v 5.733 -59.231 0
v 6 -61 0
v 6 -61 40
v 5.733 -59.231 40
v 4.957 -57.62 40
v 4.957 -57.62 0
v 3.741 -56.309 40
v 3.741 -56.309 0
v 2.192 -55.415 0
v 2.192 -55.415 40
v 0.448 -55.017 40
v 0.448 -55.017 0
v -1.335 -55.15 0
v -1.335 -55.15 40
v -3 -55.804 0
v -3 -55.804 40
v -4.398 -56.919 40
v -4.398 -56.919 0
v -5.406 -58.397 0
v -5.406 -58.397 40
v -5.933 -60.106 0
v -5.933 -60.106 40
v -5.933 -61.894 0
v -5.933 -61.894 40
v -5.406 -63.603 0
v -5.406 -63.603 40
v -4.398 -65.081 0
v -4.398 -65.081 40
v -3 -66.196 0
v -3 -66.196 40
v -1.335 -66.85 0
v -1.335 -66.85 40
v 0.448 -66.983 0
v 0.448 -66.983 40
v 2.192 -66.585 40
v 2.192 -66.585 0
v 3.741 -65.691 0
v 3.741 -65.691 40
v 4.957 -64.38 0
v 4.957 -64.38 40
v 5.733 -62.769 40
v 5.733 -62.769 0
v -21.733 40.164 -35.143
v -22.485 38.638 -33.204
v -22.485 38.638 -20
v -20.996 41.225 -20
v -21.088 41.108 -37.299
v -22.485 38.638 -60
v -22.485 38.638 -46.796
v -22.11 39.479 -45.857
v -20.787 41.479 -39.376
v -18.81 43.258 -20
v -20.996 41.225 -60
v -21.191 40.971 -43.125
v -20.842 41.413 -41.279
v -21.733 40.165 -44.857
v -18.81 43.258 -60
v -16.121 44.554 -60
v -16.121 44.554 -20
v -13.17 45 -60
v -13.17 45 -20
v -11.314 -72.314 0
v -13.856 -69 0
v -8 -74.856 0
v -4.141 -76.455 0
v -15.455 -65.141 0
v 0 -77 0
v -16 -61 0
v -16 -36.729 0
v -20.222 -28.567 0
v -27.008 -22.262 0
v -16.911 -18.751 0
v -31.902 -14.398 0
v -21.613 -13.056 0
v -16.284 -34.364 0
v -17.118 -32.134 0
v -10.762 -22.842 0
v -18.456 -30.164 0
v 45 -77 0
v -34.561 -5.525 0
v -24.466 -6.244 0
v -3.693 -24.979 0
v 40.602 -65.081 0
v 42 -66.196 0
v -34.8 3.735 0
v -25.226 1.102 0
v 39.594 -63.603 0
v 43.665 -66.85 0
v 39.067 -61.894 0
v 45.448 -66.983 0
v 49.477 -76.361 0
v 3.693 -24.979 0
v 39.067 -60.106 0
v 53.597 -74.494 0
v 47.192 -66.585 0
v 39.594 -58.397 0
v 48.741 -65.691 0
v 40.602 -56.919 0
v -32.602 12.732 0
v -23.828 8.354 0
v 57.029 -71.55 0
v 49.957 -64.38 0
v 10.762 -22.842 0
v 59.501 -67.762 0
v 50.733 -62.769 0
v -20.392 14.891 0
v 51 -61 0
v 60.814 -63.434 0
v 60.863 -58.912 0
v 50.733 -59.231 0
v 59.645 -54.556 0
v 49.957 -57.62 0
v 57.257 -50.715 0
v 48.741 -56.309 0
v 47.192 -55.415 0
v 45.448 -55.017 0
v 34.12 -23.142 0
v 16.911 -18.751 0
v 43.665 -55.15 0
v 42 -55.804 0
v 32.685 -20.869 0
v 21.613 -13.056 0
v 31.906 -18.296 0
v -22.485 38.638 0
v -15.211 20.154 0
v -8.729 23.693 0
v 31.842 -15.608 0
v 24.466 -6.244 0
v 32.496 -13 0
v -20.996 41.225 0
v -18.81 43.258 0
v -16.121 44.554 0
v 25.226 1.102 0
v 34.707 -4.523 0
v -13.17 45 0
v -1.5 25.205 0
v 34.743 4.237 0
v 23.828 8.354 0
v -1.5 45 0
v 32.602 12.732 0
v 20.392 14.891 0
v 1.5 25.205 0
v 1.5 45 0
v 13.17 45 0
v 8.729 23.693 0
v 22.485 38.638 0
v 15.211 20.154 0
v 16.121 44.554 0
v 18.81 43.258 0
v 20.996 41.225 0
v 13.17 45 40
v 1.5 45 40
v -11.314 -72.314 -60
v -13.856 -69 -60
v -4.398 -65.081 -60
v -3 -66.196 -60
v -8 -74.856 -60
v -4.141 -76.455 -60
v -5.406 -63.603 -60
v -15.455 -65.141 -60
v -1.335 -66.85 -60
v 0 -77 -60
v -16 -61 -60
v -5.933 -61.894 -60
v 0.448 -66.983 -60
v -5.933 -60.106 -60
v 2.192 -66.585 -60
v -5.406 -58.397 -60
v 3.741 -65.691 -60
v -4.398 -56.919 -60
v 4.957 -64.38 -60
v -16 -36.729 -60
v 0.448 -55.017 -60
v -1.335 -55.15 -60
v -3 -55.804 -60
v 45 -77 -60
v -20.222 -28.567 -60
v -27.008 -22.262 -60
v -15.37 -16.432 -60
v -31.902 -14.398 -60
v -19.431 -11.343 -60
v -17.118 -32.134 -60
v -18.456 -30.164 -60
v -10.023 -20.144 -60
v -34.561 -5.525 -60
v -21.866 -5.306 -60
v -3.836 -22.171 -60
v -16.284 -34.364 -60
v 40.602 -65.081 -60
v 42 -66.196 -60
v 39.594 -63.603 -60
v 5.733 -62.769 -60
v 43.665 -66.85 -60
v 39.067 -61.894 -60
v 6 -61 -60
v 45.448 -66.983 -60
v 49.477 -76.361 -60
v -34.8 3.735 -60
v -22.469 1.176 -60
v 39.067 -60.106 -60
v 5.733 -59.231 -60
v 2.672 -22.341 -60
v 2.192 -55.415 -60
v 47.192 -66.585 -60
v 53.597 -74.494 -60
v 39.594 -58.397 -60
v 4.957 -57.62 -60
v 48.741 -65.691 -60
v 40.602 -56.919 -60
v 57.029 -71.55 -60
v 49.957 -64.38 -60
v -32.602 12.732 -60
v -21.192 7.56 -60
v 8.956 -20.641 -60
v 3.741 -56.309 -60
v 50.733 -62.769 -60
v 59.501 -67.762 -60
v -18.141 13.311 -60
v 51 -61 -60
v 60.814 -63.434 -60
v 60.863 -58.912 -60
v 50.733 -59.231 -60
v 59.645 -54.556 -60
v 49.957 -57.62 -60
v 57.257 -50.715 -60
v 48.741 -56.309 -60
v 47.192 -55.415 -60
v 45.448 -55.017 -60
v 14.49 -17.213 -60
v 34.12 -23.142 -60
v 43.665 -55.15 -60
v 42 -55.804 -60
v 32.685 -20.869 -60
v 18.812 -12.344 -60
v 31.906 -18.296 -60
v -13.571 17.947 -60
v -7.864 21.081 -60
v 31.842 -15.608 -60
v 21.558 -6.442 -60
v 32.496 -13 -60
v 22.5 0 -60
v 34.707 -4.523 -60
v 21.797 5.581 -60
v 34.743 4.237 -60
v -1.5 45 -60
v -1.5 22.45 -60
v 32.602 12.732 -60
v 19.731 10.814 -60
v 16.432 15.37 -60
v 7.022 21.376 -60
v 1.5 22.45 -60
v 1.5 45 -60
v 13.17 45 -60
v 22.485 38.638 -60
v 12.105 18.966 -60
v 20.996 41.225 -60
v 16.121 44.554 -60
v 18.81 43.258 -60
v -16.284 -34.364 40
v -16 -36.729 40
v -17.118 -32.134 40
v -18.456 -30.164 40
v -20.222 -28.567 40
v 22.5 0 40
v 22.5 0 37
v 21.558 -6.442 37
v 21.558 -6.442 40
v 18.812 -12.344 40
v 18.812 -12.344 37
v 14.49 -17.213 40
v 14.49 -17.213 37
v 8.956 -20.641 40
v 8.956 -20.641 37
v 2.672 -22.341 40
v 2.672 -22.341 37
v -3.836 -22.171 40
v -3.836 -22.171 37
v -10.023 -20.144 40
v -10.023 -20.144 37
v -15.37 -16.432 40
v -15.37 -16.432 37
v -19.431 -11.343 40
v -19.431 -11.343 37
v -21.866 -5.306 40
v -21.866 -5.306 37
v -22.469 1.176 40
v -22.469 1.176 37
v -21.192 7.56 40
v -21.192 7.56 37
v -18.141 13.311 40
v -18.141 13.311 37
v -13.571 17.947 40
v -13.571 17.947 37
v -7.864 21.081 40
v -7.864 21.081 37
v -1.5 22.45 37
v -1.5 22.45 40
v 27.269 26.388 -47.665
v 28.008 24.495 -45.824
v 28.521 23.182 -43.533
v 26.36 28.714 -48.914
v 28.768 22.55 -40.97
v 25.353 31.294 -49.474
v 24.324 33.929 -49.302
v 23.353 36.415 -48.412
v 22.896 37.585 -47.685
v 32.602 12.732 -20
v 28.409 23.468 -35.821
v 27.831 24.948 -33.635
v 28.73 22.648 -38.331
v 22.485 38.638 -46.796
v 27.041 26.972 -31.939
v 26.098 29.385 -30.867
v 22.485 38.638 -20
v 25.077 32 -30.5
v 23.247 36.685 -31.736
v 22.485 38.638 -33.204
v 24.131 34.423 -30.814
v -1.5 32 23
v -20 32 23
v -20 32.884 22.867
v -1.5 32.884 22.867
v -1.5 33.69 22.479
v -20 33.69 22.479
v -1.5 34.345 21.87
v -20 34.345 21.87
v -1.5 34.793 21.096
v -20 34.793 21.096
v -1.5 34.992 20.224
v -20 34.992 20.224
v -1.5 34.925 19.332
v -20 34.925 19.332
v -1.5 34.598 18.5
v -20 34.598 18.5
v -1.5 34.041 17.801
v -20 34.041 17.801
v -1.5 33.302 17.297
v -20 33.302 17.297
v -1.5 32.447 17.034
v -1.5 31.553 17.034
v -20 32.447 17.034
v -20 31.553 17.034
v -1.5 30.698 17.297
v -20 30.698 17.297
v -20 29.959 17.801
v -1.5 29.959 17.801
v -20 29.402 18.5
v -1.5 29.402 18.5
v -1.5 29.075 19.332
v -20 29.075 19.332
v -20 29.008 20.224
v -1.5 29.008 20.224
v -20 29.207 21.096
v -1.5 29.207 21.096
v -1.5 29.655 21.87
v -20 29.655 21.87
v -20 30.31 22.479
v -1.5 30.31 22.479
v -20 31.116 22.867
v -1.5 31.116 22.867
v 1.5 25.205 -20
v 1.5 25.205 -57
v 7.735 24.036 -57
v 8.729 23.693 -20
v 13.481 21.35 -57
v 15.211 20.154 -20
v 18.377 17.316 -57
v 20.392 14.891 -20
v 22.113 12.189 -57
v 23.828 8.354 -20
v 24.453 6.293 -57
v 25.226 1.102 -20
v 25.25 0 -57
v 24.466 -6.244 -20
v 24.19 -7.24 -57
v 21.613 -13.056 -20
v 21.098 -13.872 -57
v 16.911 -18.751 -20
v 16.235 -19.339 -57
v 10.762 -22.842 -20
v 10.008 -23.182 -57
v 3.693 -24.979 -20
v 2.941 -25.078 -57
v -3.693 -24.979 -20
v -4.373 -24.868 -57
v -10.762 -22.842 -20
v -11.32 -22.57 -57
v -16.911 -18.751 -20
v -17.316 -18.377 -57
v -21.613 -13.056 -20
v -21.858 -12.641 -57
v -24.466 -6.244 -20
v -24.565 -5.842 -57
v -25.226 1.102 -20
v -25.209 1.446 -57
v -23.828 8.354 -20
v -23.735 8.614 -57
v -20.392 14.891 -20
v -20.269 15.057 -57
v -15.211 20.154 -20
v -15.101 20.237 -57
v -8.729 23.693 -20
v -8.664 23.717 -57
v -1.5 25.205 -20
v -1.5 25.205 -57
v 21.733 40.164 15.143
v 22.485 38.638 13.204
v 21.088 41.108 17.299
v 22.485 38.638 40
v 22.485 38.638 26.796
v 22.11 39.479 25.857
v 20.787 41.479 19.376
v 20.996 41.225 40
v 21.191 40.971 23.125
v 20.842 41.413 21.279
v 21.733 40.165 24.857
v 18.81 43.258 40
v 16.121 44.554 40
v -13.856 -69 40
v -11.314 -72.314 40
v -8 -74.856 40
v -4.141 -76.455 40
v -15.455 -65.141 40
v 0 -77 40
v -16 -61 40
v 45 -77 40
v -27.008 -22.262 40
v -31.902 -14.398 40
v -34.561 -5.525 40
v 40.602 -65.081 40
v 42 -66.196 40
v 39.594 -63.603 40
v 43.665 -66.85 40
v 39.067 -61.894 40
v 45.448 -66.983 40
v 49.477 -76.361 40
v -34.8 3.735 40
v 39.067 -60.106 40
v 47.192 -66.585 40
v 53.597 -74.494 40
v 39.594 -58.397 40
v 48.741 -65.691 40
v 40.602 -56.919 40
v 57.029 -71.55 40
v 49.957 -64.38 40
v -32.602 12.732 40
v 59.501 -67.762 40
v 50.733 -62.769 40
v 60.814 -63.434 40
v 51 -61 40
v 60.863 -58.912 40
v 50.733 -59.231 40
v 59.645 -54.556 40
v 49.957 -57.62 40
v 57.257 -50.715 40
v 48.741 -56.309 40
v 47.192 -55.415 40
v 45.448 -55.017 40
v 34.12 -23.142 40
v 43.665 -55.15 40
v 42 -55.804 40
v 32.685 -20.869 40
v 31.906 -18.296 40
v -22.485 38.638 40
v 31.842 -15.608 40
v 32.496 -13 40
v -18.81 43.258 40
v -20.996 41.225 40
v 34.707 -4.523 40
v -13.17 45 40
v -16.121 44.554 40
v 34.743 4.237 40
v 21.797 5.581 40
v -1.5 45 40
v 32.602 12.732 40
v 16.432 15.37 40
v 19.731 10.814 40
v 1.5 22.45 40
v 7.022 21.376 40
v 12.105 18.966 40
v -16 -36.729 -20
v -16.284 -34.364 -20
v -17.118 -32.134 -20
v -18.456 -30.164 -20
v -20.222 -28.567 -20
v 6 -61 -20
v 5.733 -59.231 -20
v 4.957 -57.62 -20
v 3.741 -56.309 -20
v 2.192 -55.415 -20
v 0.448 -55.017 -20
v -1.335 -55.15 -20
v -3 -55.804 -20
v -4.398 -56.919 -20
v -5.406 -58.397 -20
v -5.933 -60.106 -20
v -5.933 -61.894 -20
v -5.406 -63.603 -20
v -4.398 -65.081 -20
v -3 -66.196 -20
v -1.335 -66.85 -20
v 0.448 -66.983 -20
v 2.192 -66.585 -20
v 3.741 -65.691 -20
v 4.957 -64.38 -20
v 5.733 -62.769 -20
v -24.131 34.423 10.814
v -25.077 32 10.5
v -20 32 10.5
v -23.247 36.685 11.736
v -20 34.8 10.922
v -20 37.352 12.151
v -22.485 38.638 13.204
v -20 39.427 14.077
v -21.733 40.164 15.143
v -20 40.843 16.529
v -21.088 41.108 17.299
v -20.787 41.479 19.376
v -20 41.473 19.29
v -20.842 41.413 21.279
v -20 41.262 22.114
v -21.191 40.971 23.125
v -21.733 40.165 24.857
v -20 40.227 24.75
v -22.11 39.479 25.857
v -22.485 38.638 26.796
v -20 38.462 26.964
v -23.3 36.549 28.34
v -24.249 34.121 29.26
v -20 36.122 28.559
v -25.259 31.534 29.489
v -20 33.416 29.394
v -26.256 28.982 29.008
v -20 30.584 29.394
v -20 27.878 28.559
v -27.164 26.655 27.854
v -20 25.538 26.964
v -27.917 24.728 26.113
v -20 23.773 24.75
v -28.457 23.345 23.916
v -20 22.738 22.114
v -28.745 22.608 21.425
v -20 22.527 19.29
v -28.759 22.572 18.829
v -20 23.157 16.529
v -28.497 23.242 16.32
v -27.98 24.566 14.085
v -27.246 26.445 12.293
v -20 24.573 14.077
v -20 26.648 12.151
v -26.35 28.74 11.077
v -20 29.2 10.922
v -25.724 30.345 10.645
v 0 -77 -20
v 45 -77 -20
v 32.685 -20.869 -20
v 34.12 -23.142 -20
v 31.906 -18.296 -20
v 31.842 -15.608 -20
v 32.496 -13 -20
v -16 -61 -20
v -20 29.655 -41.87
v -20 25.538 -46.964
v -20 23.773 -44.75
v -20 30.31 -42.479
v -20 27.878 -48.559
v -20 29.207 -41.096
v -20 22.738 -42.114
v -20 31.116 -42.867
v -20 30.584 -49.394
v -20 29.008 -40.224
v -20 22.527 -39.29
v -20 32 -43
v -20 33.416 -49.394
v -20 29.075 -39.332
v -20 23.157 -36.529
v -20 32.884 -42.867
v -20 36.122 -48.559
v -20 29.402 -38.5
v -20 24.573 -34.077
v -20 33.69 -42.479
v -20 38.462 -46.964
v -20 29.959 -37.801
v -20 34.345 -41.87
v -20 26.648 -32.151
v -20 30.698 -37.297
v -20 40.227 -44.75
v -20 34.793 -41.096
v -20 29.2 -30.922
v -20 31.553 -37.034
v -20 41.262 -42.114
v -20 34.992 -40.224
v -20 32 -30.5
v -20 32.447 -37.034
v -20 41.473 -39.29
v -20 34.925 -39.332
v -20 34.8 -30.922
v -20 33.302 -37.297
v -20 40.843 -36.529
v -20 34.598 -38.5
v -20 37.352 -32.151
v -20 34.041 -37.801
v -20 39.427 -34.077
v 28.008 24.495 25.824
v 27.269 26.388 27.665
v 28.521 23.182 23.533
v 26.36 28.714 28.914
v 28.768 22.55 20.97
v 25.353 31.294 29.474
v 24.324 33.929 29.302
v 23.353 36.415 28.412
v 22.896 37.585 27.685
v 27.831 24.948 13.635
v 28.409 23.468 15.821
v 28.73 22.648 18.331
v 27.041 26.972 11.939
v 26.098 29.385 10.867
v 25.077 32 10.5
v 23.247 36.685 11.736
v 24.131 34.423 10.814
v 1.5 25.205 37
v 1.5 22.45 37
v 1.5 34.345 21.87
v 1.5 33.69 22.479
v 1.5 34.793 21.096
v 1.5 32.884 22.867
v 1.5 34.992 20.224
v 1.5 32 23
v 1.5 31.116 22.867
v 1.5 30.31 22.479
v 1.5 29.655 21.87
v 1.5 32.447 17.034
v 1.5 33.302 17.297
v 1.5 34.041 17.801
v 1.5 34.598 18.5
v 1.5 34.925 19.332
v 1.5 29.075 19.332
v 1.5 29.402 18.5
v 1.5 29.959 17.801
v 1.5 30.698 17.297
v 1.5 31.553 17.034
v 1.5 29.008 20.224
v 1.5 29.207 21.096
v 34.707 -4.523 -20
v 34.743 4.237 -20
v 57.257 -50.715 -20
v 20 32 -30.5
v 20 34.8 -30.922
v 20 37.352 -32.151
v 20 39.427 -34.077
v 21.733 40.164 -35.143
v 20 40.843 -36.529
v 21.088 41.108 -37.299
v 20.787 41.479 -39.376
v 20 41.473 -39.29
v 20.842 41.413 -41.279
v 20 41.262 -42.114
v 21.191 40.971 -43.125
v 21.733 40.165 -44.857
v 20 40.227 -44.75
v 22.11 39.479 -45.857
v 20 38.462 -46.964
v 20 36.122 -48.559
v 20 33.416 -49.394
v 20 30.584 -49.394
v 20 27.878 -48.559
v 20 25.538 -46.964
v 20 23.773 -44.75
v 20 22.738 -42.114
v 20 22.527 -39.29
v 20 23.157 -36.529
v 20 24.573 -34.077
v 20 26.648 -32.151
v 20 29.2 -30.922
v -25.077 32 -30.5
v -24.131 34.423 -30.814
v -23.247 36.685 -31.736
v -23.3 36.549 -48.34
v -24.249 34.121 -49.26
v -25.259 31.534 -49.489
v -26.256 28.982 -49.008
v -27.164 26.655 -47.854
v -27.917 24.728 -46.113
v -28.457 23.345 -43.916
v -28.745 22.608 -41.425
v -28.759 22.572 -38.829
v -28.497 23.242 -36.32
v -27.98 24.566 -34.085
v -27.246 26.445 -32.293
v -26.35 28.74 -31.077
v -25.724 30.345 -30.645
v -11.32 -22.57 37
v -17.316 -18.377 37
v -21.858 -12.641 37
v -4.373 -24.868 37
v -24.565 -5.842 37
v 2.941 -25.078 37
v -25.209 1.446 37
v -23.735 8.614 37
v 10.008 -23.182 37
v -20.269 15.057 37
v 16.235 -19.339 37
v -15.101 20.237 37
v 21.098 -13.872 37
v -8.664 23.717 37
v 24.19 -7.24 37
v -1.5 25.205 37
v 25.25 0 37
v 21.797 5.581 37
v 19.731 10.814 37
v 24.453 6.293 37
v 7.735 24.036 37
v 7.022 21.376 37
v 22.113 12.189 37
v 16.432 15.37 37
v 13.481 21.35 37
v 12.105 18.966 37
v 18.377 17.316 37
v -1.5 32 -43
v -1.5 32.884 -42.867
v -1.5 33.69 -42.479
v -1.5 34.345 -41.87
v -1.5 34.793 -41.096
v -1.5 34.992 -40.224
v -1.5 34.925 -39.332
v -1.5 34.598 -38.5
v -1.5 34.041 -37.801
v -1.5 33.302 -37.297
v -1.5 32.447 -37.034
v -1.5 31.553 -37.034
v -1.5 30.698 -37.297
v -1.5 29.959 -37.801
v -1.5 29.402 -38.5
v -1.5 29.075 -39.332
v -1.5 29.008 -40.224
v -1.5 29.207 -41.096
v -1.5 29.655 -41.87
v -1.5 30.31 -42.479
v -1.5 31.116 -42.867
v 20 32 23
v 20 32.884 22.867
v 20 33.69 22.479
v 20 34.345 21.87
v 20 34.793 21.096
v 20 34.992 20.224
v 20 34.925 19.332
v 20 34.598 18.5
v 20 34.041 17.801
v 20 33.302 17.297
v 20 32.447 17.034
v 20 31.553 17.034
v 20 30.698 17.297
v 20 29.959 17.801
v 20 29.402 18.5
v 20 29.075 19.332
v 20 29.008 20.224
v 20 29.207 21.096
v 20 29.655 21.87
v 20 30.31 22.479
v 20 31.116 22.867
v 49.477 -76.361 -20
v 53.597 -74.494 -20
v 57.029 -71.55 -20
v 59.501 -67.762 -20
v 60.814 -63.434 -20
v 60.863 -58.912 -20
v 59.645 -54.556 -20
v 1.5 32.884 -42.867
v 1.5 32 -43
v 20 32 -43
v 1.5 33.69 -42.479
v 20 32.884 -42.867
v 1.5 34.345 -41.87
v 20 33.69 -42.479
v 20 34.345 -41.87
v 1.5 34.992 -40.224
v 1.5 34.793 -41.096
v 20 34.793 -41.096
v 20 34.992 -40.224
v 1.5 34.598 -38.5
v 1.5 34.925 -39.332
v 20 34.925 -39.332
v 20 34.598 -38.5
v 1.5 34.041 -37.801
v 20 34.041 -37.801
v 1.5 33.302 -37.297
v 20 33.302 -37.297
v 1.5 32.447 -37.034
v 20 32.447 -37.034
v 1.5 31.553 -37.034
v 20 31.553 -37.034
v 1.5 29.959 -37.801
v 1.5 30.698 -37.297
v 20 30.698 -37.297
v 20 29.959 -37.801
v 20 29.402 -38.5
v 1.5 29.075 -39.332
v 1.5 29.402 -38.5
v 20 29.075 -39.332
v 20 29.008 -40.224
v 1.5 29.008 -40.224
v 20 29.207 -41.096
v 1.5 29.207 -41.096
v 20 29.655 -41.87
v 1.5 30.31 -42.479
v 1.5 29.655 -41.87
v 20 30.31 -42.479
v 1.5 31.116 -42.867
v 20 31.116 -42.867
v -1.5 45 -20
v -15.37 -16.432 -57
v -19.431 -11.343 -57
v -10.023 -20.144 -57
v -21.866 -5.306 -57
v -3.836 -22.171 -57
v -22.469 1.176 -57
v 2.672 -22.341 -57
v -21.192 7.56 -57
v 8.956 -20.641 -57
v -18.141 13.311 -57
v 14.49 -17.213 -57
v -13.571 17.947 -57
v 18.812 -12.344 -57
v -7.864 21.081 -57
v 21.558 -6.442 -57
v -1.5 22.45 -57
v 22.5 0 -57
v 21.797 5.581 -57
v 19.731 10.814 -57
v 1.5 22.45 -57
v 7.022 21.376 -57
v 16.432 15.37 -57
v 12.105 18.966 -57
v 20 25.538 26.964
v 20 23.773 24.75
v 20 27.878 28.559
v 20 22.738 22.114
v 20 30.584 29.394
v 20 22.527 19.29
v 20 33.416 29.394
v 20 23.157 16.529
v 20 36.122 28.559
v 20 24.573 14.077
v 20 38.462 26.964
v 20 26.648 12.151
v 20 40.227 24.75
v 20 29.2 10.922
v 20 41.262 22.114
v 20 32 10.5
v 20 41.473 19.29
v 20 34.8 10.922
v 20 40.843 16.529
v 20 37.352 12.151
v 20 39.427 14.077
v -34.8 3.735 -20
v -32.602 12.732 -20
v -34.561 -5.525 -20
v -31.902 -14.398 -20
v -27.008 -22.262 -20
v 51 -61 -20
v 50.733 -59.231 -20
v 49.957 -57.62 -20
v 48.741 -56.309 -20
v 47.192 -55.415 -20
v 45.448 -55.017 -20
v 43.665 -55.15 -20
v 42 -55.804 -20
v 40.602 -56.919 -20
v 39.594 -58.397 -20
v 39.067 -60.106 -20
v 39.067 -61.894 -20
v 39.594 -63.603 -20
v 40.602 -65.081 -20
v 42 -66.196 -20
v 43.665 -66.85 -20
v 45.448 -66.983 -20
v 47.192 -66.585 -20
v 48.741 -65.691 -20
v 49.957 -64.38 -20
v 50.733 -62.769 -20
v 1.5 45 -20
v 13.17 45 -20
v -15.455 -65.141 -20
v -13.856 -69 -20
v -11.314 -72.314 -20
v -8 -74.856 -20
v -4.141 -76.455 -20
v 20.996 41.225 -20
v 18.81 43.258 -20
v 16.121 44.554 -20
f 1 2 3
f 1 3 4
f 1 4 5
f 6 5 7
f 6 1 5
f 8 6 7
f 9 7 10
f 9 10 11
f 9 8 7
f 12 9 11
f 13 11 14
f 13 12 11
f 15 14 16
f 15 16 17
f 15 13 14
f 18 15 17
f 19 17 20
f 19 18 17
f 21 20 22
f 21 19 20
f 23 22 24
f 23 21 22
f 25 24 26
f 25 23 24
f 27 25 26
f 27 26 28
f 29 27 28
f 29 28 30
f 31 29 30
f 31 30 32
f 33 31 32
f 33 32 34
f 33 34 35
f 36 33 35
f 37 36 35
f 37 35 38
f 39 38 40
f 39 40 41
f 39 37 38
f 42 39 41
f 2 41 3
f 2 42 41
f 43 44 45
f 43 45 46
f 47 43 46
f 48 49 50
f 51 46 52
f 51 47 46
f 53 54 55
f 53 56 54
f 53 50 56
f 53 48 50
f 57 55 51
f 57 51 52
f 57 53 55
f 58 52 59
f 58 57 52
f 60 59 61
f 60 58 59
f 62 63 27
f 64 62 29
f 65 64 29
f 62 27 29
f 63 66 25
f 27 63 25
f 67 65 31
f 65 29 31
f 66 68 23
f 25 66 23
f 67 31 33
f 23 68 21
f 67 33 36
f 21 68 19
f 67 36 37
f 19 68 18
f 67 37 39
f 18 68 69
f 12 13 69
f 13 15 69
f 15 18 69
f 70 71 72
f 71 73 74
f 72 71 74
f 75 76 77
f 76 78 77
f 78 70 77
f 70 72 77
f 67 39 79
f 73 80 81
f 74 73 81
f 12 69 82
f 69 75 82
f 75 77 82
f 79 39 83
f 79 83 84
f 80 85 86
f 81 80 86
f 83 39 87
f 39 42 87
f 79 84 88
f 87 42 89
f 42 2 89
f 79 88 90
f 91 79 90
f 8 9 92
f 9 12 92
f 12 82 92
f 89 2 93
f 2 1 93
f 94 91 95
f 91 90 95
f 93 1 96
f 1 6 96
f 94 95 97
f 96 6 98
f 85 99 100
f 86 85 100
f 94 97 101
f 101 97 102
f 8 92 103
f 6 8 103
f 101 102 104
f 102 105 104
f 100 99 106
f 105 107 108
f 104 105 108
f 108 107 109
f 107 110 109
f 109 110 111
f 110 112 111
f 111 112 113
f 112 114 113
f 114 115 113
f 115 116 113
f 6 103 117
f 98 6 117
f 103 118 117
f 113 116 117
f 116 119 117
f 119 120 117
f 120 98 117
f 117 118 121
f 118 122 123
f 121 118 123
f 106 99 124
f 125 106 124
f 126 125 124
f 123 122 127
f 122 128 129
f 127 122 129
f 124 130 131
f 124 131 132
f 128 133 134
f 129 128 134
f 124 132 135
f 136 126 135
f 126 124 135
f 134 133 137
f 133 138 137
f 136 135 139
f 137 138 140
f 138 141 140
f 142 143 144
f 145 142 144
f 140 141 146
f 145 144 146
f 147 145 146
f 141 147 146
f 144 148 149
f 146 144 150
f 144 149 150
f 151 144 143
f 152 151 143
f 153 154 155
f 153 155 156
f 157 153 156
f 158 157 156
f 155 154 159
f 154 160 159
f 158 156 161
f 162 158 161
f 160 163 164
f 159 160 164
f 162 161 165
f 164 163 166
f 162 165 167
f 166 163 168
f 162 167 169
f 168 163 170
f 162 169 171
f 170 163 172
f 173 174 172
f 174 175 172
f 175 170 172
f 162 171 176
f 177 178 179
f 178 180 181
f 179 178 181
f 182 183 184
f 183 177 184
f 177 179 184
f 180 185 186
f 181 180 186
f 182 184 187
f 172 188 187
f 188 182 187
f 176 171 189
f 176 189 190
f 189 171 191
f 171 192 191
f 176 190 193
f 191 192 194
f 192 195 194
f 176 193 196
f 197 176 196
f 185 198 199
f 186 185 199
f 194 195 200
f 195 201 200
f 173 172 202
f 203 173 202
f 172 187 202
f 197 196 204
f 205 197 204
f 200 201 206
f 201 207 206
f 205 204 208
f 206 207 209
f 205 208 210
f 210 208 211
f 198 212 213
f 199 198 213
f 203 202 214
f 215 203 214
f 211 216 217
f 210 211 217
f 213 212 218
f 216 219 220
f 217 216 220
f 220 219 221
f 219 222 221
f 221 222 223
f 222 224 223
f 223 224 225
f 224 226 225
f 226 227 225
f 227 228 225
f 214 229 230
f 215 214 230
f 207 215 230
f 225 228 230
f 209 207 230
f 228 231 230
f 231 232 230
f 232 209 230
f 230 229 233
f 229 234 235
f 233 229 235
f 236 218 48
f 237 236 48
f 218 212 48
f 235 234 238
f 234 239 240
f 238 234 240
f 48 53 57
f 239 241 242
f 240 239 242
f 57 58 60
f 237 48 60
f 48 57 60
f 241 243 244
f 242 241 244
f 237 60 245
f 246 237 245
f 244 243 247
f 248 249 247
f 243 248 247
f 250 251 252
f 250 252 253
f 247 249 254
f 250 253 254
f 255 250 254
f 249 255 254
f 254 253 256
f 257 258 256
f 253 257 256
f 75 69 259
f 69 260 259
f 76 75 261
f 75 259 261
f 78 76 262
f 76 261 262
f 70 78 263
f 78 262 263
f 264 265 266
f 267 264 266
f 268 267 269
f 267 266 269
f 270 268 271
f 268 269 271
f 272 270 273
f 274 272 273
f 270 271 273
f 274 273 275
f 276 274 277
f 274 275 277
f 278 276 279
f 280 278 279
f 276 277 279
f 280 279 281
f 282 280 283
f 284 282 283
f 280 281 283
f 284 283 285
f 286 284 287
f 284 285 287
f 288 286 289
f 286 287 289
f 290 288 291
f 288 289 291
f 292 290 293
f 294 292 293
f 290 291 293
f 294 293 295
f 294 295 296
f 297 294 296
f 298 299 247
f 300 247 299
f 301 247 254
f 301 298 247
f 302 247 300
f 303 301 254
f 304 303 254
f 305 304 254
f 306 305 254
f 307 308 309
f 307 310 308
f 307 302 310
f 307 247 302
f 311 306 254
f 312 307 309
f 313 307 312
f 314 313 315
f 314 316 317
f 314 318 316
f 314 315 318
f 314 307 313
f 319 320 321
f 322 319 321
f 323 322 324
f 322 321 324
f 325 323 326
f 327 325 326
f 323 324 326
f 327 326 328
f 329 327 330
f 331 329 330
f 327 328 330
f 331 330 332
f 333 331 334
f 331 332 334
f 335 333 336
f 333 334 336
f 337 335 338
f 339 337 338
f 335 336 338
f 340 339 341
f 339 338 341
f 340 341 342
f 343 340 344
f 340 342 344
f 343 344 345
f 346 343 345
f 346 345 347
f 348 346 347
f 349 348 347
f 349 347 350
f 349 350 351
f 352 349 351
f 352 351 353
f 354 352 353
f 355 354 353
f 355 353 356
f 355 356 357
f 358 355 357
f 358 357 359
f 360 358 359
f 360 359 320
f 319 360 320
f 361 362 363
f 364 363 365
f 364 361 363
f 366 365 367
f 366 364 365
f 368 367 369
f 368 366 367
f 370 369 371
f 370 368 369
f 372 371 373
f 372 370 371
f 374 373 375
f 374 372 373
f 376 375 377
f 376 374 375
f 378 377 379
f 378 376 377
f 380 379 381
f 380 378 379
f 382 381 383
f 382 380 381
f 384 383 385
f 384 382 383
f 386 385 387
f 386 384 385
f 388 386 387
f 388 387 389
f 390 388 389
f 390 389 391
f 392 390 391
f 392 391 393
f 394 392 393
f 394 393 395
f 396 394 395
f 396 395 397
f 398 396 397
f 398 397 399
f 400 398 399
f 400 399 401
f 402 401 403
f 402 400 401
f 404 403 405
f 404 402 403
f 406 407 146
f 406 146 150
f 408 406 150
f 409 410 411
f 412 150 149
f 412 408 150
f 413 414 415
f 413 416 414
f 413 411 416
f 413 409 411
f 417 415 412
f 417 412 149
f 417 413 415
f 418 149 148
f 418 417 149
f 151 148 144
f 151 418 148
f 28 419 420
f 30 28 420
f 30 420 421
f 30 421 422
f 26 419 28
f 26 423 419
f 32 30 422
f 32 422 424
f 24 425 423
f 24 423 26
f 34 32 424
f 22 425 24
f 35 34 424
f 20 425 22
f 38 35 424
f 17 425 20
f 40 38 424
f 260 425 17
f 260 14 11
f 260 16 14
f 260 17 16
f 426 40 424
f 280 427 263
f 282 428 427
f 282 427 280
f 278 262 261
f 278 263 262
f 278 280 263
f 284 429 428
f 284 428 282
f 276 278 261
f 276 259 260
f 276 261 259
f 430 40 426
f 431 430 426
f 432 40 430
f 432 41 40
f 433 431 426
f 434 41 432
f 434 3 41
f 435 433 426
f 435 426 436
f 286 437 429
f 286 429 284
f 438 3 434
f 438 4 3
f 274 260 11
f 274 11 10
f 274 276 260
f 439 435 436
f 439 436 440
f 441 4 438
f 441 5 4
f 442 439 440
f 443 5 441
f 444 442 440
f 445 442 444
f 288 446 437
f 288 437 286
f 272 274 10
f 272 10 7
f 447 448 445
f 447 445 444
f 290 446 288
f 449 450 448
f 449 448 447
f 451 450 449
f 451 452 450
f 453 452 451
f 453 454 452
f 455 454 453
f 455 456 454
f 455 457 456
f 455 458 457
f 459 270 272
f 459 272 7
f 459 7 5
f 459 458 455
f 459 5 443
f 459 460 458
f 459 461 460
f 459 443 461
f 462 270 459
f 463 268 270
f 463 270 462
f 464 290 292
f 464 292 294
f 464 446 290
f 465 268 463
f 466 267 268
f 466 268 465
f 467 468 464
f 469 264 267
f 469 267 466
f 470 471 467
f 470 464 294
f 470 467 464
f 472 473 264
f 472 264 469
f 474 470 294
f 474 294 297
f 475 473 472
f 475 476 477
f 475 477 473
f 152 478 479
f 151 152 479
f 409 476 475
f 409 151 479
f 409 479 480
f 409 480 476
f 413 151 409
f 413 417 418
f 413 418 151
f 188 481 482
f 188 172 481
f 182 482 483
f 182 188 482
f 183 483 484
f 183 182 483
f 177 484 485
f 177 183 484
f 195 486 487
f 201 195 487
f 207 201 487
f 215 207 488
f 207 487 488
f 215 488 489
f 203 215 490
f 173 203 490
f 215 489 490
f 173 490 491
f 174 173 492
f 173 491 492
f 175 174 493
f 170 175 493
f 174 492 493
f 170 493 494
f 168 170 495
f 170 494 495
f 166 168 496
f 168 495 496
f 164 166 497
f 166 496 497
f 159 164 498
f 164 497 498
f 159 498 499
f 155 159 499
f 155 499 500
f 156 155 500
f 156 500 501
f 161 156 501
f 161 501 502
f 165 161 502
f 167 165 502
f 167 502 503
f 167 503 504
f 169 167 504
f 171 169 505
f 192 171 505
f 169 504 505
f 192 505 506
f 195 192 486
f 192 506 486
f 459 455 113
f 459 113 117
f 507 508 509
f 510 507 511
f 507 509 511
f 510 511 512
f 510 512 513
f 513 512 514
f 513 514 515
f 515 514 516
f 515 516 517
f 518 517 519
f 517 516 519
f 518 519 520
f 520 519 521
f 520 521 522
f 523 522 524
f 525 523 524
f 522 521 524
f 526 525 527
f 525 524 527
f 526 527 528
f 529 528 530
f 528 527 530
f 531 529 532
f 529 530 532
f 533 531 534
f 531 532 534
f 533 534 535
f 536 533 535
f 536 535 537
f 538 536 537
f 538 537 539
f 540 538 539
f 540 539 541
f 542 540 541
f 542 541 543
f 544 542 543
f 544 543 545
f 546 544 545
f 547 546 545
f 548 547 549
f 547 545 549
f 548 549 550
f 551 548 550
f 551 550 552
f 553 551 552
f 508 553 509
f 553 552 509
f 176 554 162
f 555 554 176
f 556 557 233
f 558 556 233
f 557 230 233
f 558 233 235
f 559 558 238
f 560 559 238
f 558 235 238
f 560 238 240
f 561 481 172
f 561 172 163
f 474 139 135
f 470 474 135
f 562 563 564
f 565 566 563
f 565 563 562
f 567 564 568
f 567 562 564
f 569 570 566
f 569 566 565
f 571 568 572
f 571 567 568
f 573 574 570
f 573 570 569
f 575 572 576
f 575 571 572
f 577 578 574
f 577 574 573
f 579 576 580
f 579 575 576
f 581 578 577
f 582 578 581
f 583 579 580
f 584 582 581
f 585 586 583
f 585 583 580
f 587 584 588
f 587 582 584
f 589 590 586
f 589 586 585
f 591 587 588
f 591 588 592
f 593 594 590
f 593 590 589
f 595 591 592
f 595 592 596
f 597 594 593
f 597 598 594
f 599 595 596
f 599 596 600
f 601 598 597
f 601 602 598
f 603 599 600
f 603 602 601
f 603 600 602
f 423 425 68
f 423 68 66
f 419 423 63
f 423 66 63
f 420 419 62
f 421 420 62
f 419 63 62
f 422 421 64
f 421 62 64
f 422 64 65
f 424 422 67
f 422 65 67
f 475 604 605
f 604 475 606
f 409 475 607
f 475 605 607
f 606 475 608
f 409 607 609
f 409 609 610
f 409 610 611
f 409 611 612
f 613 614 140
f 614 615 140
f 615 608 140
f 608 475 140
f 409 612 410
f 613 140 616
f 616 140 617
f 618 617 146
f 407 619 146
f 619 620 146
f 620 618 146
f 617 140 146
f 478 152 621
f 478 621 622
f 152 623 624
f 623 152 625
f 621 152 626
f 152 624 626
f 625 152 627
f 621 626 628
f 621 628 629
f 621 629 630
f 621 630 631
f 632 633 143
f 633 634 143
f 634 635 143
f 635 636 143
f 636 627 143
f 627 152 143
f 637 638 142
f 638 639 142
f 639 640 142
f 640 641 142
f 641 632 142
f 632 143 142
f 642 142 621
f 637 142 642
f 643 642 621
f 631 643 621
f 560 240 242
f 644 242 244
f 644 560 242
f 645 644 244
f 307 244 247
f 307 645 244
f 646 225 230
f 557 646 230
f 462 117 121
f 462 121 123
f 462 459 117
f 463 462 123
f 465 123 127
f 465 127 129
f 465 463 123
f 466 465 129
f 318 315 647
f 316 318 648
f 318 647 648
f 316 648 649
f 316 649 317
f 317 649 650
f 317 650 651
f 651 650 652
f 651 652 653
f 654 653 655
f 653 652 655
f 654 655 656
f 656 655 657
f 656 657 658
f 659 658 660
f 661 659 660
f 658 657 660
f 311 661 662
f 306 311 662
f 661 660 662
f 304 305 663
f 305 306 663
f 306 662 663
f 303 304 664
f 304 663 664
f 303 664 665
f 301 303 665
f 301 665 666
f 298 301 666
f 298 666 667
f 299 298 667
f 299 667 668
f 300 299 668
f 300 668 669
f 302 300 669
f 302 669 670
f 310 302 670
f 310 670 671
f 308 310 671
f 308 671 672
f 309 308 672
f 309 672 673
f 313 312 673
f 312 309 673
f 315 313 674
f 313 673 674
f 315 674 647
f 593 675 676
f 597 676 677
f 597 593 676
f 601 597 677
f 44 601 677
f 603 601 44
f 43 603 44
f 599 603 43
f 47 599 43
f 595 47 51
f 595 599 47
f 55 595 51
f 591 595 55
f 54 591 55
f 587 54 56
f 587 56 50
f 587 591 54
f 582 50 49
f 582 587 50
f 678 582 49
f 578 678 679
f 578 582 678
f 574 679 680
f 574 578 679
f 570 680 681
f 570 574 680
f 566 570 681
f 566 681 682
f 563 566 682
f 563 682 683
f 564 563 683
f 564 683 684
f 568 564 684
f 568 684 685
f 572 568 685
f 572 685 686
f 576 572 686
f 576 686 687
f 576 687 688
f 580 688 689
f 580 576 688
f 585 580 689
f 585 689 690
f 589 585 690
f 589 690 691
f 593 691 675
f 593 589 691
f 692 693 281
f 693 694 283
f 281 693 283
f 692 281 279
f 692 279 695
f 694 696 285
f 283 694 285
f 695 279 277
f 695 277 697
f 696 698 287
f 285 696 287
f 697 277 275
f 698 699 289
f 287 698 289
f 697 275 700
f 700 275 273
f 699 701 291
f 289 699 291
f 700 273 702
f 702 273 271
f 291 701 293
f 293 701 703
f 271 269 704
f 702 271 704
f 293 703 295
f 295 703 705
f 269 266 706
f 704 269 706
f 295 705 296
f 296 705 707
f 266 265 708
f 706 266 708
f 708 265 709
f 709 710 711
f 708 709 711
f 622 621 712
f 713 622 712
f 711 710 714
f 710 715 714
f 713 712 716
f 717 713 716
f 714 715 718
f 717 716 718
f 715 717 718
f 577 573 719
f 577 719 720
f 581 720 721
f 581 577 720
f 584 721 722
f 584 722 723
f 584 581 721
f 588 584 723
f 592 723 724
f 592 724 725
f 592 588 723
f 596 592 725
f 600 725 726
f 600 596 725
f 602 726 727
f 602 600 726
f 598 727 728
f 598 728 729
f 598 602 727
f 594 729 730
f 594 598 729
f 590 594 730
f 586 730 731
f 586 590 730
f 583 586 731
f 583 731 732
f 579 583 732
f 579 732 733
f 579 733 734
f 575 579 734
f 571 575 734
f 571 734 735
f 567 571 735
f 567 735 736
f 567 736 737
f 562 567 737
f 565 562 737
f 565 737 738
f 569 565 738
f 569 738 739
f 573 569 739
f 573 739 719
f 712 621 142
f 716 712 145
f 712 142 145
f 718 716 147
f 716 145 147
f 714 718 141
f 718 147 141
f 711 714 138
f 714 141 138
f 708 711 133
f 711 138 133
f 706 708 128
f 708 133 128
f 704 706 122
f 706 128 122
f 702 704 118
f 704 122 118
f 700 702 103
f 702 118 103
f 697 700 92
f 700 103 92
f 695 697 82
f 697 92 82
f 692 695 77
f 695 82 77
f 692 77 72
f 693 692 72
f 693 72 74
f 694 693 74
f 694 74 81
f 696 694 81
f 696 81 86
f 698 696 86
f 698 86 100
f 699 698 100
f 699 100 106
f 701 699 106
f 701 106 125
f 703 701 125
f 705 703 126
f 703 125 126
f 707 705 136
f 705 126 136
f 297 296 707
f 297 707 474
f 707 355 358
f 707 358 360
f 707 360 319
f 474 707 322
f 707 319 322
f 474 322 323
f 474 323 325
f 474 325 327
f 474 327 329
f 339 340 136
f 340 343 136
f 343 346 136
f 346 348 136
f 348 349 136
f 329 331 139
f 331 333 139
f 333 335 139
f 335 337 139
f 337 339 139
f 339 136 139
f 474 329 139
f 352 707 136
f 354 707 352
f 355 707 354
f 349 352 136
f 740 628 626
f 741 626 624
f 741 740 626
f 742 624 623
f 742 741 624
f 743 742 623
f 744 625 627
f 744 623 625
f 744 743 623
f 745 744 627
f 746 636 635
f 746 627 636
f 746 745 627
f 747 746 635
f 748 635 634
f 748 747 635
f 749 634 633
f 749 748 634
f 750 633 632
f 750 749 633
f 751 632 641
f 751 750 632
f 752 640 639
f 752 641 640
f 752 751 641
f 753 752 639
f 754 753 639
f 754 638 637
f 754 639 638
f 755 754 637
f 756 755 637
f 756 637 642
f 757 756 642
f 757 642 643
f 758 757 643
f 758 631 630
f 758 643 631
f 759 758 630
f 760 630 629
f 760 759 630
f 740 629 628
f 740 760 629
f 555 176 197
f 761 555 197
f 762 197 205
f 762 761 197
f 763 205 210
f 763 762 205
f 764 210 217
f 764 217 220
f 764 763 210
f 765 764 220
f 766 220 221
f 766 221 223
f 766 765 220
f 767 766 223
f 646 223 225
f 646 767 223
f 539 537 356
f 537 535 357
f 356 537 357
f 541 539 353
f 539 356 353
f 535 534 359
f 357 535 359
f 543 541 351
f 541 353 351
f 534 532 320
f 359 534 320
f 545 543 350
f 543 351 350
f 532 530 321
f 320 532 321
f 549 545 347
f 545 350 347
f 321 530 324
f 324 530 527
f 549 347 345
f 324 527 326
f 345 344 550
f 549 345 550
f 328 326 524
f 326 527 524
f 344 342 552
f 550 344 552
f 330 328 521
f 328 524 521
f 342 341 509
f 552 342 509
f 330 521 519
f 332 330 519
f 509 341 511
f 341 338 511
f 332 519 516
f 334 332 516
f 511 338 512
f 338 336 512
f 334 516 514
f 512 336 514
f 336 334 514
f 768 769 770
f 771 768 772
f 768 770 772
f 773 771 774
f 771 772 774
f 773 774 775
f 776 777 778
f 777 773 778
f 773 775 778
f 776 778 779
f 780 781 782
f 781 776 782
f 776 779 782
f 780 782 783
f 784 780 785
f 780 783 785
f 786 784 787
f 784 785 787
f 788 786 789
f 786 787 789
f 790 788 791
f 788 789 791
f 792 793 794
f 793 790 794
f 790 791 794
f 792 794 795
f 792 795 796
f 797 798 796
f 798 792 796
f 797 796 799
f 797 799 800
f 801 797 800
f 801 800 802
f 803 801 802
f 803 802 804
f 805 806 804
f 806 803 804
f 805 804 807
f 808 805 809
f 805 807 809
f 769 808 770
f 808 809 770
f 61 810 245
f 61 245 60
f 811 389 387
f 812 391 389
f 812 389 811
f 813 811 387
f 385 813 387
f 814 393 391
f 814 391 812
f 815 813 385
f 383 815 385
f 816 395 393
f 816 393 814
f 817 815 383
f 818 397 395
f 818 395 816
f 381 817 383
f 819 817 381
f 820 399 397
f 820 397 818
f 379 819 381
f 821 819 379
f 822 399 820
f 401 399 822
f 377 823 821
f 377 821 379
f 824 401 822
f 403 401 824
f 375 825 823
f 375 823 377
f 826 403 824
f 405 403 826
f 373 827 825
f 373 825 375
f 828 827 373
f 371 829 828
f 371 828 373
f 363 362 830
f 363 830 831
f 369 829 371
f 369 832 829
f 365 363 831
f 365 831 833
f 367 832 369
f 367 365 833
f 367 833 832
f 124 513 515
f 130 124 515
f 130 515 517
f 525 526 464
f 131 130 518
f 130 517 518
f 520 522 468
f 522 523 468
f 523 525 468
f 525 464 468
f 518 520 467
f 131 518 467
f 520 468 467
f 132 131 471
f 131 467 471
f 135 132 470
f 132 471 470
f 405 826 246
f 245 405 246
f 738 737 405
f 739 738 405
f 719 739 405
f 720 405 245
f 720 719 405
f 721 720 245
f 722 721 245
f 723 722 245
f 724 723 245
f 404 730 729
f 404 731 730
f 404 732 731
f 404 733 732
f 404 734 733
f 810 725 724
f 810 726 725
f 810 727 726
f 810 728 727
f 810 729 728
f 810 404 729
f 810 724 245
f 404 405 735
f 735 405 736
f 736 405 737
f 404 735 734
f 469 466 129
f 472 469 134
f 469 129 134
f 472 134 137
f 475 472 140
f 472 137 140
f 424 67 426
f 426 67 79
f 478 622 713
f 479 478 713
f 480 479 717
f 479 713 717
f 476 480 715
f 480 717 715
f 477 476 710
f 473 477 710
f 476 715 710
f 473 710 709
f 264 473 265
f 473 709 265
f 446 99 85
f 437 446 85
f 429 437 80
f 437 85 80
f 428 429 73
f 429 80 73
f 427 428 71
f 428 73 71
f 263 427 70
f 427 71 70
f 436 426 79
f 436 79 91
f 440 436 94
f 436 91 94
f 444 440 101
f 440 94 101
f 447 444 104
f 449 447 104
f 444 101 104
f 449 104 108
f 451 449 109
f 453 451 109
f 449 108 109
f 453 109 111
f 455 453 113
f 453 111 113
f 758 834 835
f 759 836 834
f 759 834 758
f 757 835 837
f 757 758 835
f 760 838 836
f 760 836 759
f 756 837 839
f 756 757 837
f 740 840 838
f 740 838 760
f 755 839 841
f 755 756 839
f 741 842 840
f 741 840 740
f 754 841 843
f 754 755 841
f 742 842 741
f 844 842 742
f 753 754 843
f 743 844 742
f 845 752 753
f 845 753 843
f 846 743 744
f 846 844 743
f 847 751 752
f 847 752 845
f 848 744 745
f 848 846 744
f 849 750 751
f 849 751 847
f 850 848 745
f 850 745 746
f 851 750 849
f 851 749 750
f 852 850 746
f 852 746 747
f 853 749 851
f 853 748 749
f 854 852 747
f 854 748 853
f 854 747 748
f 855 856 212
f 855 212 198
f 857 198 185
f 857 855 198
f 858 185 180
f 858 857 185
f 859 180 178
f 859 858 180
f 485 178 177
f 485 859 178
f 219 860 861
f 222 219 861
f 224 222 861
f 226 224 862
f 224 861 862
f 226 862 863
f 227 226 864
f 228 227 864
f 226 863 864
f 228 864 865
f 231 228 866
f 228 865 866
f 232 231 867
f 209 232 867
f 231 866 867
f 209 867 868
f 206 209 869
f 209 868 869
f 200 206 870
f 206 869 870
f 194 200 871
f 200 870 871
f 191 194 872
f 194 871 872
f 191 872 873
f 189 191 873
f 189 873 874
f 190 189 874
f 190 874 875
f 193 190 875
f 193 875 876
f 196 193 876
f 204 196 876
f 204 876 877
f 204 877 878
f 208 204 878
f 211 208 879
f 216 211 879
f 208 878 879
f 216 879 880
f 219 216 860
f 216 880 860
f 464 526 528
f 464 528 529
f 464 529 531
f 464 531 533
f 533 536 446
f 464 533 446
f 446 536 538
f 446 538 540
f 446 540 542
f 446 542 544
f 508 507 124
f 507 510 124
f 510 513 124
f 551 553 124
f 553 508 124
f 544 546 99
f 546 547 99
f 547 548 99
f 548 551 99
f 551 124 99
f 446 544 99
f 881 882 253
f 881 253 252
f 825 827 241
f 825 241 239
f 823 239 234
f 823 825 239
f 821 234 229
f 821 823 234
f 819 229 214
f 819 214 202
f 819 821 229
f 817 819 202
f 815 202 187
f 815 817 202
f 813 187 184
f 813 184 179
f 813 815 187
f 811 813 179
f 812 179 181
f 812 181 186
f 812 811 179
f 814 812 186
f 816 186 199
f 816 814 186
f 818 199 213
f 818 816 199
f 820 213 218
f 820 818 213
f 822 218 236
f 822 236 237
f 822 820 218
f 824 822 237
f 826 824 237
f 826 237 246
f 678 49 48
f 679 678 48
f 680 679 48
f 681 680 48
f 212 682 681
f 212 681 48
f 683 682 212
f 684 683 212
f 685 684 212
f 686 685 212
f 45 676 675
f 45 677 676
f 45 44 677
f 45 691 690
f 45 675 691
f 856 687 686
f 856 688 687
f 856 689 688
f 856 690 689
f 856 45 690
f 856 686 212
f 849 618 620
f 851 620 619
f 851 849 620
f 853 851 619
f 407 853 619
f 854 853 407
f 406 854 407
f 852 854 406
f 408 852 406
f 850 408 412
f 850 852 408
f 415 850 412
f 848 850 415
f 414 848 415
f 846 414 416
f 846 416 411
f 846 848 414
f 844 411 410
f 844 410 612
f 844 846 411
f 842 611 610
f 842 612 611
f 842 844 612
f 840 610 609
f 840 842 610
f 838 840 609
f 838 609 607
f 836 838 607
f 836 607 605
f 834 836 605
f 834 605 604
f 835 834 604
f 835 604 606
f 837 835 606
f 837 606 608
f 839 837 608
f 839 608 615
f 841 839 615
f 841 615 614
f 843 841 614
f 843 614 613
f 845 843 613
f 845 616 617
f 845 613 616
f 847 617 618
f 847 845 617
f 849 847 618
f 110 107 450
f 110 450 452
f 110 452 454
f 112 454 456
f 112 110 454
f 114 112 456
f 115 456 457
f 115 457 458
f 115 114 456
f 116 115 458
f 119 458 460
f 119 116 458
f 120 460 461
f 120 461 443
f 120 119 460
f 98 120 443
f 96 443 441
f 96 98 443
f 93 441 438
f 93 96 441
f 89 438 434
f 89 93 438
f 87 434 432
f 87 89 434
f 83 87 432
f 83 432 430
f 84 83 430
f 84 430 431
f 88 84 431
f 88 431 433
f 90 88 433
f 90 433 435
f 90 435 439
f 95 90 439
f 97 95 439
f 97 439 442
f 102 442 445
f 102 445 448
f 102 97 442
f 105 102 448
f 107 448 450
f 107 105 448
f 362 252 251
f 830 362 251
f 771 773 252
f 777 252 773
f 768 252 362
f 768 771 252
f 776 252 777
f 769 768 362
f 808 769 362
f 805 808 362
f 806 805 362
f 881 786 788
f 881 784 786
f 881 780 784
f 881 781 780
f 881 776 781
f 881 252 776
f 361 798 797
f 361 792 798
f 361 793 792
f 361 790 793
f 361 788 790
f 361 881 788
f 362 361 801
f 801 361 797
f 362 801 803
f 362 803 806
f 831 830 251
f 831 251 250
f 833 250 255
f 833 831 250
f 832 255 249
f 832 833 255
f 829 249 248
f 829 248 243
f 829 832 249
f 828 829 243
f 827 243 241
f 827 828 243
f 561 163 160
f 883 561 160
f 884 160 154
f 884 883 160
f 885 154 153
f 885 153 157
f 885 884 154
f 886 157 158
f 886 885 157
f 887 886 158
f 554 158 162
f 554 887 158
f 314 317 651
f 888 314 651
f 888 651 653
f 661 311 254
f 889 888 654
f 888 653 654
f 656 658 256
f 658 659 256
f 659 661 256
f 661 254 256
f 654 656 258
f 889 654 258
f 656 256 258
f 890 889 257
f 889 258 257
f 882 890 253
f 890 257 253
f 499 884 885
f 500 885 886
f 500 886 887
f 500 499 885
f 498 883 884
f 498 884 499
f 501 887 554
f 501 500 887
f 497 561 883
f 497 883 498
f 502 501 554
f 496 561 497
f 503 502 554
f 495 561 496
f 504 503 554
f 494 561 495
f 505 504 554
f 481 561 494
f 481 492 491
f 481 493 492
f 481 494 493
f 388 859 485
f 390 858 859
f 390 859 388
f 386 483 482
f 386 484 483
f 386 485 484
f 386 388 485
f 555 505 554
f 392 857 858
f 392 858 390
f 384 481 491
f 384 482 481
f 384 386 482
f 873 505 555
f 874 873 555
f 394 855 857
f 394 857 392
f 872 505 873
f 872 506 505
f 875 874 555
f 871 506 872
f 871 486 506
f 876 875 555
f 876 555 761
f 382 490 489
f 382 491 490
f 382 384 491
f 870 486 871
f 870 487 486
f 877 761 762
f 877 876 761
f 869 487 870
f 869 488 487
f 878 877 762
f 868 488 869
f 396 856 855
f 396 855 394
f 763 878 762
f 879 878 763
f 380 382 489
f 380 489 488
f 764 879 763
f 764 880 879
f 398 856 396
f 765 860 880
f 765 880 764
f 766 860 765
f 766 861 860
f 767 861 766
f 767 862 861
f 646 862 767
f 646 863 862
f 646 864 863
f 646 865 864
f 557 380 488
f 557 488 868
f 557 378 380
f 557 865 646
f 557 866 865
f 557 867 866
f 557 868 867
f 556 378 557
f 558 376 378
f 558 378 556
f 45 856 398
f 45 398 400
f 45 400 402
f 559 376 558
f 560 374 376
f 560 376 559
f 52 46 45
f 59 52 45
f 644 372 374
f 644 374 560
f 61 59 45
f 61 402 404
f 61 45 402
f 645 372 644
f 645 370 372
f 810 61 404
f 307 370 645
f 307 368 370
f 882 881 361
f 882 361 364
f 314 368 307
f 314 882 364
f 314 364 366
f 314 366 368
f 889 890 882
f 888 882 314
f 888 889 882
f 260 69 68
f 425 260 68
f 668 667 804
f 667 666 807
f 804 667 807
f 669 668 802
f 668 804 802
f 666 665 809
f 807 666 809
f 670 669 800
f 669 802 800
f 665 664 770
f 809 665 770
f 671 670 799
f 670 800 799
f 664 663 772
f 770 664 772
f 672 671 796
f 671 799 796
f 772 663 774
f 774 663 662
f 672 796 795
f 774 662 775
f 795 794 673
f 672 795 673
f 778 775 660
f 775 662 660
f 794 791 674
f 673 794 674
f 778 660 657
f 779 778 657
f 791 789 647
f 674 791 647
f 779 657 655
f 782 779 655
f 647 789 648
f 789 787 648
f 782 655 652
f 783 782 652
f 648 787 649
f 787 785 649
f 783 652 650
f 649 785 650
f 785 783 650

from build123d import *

# Parameters (mm, degrees)
SKETCH1_R           = 6
BOSS_EXTRUDE3_DEPTH = 40
FILLET2_R           = 10
SKETCH5_R           = 9.5
CUT_EXTRUDE1_DEPTH  = 10
SKETCH6_R           = 3
CUT_EXTRUDE2_DEPTH  = 21.5
BOSS_EXTRUDE4_START = -3
BOSS_EXTRUDE4_DEPTH = 3


with BuildPart() as part:
    # Sketch1 → Boss-Extrude3 (new body)
    with BuildSketch(Plane.XY):
        with BuildLine():
            Line((-16, -31.128764833), (-16, -61))
            ThreePointArc((-16, -61), (-11.313708499, -72.313708499), (0, -77))
            Line((0, -77), (45, -77))
            ThreePointArc((45, -77), (59.500924593, -67.761892188), (57.25671109, -50.715398245))
            Line((57.25671109, -50.715398245), (29.928255065, -18.146612597))
            ThreePointArc((29.928255065, -18.146612597), (34.869538701, -3.019150675), (32.601897088, 12.732490183))
            Line((32.601897088, 12.732490183), (20, 45))
            Line((20, 45), (1.5, 45))
            Line((1.5, 45), (1.5, 25.205406166))
            ThreePointArc((1.5, 25.205406166), (0, -25.25), (-1.5, 25.205406166))
            Line((-1.5, 25.205406166), (-1.5, 45))
            Line((-1.5, 45), (-20, 45))
            Line((-20, 45), (-32.601897088, 12.732490183))
            ThreePointArc((-32.601897088, 12.732490183), (-32.733599298, -12.389974858), (-16, -31.128764833))
        make_face()
        with Locations((0, -61)):
            Circle(SKETCH1_R, mode=Mode.SUBTRACT)
        with Locations((45, -61)):
            Circle(SKETCH1_R, mode=Mode.SUBTRACT)
    extrude(amount=BOSS_EXTRUDE3_DEPTH)

    # Fillet2
    fillet2_edges = [part.edges().sort_by_distance(p)[0] for p in [
        (-20, 45, 20),
        (20, 45, 20),
        (29.928255065, -18.146612597, 20),
        (-16, -31.128764833, 20),
    ]]
    fillet(fillet2_edges, radius=FILLET2_R)

    # Sketch5 → Cut-Extrude1 (cut)
    with BuildSketch(Plane(origin=(-20, 0, 0), x_dir=(0, 0, -1), z_dir=(1, 0, 0))):
        with Locations((-20, 32)):
            Circle(SKETCH5_R)
    cut_extrude1 = extrude(amount=-CUT_EXTRUDE1_DEPTH, mode=Mode.SUBTRACT)

    # Sketch6 → Cut-Extrude2 (cut)
    with BuildSketch(Plane.ZY.offset(20)):
        with Locations((20, 32)):
            Circle(SKETCH6_R)
    cut_extrude2 = extrude(amount=-CUT_EXTRUDE2_DEPTH, mode=Mode.SUBTRACT)

    # Mirror3: Cut-Extrude1, Cut-Extrude2 across plane
    add(cut_extrude1.mirror(Plane(origin=(0, 0, 0), x_dir=(0, 0, 1), z_dir=(1, 0, 0))), mode=Mode.SUBTRACT)
    add(cut_extrude2.mirror(Plane(origin=(0, 0, 0), x_dir=(0, 0, 1), z_dir=(1, 0, 0))), mode=Mode.SUBTRACT)

    # Sketch7 → Boss-Extrude4 (add)
    with BuildSketch(Plane.XY.offset(40).offset(BOSS_EXTRUDE4_START)):
        with BuildLine():
            ThreePointArc((22.5, 0), (-15.370426149, -16.431676725), (-1.5, 22.449944321))
            Line((-1.5, 22.449944321), (-1.5, 25.205406166))
            ThreePointArc((-1.5, 25.205406166), (-17.315996939, -18.377125727), (25.25, 0))
            ThreePointArc((25.25, 0), (18.377125727, 17.315996939), (1.5, 25.205406166))
            Line((1.5, 25.205406166), (1.5, 22.449944321))
            ThreePointArc((1.5, 22.449944321), (16.431676725, 15.370426149), (22.5, 0))
        make_face()
    extrude(amount=BOSS_EXTRUDE4_DEPTH)


with BuildPart() as body_2:
    # Mirror6: mirrored copy
    add(part.part.mirror(Plane.XY.offset(-10)))


solid = Compound([part.part, body_2.part])
